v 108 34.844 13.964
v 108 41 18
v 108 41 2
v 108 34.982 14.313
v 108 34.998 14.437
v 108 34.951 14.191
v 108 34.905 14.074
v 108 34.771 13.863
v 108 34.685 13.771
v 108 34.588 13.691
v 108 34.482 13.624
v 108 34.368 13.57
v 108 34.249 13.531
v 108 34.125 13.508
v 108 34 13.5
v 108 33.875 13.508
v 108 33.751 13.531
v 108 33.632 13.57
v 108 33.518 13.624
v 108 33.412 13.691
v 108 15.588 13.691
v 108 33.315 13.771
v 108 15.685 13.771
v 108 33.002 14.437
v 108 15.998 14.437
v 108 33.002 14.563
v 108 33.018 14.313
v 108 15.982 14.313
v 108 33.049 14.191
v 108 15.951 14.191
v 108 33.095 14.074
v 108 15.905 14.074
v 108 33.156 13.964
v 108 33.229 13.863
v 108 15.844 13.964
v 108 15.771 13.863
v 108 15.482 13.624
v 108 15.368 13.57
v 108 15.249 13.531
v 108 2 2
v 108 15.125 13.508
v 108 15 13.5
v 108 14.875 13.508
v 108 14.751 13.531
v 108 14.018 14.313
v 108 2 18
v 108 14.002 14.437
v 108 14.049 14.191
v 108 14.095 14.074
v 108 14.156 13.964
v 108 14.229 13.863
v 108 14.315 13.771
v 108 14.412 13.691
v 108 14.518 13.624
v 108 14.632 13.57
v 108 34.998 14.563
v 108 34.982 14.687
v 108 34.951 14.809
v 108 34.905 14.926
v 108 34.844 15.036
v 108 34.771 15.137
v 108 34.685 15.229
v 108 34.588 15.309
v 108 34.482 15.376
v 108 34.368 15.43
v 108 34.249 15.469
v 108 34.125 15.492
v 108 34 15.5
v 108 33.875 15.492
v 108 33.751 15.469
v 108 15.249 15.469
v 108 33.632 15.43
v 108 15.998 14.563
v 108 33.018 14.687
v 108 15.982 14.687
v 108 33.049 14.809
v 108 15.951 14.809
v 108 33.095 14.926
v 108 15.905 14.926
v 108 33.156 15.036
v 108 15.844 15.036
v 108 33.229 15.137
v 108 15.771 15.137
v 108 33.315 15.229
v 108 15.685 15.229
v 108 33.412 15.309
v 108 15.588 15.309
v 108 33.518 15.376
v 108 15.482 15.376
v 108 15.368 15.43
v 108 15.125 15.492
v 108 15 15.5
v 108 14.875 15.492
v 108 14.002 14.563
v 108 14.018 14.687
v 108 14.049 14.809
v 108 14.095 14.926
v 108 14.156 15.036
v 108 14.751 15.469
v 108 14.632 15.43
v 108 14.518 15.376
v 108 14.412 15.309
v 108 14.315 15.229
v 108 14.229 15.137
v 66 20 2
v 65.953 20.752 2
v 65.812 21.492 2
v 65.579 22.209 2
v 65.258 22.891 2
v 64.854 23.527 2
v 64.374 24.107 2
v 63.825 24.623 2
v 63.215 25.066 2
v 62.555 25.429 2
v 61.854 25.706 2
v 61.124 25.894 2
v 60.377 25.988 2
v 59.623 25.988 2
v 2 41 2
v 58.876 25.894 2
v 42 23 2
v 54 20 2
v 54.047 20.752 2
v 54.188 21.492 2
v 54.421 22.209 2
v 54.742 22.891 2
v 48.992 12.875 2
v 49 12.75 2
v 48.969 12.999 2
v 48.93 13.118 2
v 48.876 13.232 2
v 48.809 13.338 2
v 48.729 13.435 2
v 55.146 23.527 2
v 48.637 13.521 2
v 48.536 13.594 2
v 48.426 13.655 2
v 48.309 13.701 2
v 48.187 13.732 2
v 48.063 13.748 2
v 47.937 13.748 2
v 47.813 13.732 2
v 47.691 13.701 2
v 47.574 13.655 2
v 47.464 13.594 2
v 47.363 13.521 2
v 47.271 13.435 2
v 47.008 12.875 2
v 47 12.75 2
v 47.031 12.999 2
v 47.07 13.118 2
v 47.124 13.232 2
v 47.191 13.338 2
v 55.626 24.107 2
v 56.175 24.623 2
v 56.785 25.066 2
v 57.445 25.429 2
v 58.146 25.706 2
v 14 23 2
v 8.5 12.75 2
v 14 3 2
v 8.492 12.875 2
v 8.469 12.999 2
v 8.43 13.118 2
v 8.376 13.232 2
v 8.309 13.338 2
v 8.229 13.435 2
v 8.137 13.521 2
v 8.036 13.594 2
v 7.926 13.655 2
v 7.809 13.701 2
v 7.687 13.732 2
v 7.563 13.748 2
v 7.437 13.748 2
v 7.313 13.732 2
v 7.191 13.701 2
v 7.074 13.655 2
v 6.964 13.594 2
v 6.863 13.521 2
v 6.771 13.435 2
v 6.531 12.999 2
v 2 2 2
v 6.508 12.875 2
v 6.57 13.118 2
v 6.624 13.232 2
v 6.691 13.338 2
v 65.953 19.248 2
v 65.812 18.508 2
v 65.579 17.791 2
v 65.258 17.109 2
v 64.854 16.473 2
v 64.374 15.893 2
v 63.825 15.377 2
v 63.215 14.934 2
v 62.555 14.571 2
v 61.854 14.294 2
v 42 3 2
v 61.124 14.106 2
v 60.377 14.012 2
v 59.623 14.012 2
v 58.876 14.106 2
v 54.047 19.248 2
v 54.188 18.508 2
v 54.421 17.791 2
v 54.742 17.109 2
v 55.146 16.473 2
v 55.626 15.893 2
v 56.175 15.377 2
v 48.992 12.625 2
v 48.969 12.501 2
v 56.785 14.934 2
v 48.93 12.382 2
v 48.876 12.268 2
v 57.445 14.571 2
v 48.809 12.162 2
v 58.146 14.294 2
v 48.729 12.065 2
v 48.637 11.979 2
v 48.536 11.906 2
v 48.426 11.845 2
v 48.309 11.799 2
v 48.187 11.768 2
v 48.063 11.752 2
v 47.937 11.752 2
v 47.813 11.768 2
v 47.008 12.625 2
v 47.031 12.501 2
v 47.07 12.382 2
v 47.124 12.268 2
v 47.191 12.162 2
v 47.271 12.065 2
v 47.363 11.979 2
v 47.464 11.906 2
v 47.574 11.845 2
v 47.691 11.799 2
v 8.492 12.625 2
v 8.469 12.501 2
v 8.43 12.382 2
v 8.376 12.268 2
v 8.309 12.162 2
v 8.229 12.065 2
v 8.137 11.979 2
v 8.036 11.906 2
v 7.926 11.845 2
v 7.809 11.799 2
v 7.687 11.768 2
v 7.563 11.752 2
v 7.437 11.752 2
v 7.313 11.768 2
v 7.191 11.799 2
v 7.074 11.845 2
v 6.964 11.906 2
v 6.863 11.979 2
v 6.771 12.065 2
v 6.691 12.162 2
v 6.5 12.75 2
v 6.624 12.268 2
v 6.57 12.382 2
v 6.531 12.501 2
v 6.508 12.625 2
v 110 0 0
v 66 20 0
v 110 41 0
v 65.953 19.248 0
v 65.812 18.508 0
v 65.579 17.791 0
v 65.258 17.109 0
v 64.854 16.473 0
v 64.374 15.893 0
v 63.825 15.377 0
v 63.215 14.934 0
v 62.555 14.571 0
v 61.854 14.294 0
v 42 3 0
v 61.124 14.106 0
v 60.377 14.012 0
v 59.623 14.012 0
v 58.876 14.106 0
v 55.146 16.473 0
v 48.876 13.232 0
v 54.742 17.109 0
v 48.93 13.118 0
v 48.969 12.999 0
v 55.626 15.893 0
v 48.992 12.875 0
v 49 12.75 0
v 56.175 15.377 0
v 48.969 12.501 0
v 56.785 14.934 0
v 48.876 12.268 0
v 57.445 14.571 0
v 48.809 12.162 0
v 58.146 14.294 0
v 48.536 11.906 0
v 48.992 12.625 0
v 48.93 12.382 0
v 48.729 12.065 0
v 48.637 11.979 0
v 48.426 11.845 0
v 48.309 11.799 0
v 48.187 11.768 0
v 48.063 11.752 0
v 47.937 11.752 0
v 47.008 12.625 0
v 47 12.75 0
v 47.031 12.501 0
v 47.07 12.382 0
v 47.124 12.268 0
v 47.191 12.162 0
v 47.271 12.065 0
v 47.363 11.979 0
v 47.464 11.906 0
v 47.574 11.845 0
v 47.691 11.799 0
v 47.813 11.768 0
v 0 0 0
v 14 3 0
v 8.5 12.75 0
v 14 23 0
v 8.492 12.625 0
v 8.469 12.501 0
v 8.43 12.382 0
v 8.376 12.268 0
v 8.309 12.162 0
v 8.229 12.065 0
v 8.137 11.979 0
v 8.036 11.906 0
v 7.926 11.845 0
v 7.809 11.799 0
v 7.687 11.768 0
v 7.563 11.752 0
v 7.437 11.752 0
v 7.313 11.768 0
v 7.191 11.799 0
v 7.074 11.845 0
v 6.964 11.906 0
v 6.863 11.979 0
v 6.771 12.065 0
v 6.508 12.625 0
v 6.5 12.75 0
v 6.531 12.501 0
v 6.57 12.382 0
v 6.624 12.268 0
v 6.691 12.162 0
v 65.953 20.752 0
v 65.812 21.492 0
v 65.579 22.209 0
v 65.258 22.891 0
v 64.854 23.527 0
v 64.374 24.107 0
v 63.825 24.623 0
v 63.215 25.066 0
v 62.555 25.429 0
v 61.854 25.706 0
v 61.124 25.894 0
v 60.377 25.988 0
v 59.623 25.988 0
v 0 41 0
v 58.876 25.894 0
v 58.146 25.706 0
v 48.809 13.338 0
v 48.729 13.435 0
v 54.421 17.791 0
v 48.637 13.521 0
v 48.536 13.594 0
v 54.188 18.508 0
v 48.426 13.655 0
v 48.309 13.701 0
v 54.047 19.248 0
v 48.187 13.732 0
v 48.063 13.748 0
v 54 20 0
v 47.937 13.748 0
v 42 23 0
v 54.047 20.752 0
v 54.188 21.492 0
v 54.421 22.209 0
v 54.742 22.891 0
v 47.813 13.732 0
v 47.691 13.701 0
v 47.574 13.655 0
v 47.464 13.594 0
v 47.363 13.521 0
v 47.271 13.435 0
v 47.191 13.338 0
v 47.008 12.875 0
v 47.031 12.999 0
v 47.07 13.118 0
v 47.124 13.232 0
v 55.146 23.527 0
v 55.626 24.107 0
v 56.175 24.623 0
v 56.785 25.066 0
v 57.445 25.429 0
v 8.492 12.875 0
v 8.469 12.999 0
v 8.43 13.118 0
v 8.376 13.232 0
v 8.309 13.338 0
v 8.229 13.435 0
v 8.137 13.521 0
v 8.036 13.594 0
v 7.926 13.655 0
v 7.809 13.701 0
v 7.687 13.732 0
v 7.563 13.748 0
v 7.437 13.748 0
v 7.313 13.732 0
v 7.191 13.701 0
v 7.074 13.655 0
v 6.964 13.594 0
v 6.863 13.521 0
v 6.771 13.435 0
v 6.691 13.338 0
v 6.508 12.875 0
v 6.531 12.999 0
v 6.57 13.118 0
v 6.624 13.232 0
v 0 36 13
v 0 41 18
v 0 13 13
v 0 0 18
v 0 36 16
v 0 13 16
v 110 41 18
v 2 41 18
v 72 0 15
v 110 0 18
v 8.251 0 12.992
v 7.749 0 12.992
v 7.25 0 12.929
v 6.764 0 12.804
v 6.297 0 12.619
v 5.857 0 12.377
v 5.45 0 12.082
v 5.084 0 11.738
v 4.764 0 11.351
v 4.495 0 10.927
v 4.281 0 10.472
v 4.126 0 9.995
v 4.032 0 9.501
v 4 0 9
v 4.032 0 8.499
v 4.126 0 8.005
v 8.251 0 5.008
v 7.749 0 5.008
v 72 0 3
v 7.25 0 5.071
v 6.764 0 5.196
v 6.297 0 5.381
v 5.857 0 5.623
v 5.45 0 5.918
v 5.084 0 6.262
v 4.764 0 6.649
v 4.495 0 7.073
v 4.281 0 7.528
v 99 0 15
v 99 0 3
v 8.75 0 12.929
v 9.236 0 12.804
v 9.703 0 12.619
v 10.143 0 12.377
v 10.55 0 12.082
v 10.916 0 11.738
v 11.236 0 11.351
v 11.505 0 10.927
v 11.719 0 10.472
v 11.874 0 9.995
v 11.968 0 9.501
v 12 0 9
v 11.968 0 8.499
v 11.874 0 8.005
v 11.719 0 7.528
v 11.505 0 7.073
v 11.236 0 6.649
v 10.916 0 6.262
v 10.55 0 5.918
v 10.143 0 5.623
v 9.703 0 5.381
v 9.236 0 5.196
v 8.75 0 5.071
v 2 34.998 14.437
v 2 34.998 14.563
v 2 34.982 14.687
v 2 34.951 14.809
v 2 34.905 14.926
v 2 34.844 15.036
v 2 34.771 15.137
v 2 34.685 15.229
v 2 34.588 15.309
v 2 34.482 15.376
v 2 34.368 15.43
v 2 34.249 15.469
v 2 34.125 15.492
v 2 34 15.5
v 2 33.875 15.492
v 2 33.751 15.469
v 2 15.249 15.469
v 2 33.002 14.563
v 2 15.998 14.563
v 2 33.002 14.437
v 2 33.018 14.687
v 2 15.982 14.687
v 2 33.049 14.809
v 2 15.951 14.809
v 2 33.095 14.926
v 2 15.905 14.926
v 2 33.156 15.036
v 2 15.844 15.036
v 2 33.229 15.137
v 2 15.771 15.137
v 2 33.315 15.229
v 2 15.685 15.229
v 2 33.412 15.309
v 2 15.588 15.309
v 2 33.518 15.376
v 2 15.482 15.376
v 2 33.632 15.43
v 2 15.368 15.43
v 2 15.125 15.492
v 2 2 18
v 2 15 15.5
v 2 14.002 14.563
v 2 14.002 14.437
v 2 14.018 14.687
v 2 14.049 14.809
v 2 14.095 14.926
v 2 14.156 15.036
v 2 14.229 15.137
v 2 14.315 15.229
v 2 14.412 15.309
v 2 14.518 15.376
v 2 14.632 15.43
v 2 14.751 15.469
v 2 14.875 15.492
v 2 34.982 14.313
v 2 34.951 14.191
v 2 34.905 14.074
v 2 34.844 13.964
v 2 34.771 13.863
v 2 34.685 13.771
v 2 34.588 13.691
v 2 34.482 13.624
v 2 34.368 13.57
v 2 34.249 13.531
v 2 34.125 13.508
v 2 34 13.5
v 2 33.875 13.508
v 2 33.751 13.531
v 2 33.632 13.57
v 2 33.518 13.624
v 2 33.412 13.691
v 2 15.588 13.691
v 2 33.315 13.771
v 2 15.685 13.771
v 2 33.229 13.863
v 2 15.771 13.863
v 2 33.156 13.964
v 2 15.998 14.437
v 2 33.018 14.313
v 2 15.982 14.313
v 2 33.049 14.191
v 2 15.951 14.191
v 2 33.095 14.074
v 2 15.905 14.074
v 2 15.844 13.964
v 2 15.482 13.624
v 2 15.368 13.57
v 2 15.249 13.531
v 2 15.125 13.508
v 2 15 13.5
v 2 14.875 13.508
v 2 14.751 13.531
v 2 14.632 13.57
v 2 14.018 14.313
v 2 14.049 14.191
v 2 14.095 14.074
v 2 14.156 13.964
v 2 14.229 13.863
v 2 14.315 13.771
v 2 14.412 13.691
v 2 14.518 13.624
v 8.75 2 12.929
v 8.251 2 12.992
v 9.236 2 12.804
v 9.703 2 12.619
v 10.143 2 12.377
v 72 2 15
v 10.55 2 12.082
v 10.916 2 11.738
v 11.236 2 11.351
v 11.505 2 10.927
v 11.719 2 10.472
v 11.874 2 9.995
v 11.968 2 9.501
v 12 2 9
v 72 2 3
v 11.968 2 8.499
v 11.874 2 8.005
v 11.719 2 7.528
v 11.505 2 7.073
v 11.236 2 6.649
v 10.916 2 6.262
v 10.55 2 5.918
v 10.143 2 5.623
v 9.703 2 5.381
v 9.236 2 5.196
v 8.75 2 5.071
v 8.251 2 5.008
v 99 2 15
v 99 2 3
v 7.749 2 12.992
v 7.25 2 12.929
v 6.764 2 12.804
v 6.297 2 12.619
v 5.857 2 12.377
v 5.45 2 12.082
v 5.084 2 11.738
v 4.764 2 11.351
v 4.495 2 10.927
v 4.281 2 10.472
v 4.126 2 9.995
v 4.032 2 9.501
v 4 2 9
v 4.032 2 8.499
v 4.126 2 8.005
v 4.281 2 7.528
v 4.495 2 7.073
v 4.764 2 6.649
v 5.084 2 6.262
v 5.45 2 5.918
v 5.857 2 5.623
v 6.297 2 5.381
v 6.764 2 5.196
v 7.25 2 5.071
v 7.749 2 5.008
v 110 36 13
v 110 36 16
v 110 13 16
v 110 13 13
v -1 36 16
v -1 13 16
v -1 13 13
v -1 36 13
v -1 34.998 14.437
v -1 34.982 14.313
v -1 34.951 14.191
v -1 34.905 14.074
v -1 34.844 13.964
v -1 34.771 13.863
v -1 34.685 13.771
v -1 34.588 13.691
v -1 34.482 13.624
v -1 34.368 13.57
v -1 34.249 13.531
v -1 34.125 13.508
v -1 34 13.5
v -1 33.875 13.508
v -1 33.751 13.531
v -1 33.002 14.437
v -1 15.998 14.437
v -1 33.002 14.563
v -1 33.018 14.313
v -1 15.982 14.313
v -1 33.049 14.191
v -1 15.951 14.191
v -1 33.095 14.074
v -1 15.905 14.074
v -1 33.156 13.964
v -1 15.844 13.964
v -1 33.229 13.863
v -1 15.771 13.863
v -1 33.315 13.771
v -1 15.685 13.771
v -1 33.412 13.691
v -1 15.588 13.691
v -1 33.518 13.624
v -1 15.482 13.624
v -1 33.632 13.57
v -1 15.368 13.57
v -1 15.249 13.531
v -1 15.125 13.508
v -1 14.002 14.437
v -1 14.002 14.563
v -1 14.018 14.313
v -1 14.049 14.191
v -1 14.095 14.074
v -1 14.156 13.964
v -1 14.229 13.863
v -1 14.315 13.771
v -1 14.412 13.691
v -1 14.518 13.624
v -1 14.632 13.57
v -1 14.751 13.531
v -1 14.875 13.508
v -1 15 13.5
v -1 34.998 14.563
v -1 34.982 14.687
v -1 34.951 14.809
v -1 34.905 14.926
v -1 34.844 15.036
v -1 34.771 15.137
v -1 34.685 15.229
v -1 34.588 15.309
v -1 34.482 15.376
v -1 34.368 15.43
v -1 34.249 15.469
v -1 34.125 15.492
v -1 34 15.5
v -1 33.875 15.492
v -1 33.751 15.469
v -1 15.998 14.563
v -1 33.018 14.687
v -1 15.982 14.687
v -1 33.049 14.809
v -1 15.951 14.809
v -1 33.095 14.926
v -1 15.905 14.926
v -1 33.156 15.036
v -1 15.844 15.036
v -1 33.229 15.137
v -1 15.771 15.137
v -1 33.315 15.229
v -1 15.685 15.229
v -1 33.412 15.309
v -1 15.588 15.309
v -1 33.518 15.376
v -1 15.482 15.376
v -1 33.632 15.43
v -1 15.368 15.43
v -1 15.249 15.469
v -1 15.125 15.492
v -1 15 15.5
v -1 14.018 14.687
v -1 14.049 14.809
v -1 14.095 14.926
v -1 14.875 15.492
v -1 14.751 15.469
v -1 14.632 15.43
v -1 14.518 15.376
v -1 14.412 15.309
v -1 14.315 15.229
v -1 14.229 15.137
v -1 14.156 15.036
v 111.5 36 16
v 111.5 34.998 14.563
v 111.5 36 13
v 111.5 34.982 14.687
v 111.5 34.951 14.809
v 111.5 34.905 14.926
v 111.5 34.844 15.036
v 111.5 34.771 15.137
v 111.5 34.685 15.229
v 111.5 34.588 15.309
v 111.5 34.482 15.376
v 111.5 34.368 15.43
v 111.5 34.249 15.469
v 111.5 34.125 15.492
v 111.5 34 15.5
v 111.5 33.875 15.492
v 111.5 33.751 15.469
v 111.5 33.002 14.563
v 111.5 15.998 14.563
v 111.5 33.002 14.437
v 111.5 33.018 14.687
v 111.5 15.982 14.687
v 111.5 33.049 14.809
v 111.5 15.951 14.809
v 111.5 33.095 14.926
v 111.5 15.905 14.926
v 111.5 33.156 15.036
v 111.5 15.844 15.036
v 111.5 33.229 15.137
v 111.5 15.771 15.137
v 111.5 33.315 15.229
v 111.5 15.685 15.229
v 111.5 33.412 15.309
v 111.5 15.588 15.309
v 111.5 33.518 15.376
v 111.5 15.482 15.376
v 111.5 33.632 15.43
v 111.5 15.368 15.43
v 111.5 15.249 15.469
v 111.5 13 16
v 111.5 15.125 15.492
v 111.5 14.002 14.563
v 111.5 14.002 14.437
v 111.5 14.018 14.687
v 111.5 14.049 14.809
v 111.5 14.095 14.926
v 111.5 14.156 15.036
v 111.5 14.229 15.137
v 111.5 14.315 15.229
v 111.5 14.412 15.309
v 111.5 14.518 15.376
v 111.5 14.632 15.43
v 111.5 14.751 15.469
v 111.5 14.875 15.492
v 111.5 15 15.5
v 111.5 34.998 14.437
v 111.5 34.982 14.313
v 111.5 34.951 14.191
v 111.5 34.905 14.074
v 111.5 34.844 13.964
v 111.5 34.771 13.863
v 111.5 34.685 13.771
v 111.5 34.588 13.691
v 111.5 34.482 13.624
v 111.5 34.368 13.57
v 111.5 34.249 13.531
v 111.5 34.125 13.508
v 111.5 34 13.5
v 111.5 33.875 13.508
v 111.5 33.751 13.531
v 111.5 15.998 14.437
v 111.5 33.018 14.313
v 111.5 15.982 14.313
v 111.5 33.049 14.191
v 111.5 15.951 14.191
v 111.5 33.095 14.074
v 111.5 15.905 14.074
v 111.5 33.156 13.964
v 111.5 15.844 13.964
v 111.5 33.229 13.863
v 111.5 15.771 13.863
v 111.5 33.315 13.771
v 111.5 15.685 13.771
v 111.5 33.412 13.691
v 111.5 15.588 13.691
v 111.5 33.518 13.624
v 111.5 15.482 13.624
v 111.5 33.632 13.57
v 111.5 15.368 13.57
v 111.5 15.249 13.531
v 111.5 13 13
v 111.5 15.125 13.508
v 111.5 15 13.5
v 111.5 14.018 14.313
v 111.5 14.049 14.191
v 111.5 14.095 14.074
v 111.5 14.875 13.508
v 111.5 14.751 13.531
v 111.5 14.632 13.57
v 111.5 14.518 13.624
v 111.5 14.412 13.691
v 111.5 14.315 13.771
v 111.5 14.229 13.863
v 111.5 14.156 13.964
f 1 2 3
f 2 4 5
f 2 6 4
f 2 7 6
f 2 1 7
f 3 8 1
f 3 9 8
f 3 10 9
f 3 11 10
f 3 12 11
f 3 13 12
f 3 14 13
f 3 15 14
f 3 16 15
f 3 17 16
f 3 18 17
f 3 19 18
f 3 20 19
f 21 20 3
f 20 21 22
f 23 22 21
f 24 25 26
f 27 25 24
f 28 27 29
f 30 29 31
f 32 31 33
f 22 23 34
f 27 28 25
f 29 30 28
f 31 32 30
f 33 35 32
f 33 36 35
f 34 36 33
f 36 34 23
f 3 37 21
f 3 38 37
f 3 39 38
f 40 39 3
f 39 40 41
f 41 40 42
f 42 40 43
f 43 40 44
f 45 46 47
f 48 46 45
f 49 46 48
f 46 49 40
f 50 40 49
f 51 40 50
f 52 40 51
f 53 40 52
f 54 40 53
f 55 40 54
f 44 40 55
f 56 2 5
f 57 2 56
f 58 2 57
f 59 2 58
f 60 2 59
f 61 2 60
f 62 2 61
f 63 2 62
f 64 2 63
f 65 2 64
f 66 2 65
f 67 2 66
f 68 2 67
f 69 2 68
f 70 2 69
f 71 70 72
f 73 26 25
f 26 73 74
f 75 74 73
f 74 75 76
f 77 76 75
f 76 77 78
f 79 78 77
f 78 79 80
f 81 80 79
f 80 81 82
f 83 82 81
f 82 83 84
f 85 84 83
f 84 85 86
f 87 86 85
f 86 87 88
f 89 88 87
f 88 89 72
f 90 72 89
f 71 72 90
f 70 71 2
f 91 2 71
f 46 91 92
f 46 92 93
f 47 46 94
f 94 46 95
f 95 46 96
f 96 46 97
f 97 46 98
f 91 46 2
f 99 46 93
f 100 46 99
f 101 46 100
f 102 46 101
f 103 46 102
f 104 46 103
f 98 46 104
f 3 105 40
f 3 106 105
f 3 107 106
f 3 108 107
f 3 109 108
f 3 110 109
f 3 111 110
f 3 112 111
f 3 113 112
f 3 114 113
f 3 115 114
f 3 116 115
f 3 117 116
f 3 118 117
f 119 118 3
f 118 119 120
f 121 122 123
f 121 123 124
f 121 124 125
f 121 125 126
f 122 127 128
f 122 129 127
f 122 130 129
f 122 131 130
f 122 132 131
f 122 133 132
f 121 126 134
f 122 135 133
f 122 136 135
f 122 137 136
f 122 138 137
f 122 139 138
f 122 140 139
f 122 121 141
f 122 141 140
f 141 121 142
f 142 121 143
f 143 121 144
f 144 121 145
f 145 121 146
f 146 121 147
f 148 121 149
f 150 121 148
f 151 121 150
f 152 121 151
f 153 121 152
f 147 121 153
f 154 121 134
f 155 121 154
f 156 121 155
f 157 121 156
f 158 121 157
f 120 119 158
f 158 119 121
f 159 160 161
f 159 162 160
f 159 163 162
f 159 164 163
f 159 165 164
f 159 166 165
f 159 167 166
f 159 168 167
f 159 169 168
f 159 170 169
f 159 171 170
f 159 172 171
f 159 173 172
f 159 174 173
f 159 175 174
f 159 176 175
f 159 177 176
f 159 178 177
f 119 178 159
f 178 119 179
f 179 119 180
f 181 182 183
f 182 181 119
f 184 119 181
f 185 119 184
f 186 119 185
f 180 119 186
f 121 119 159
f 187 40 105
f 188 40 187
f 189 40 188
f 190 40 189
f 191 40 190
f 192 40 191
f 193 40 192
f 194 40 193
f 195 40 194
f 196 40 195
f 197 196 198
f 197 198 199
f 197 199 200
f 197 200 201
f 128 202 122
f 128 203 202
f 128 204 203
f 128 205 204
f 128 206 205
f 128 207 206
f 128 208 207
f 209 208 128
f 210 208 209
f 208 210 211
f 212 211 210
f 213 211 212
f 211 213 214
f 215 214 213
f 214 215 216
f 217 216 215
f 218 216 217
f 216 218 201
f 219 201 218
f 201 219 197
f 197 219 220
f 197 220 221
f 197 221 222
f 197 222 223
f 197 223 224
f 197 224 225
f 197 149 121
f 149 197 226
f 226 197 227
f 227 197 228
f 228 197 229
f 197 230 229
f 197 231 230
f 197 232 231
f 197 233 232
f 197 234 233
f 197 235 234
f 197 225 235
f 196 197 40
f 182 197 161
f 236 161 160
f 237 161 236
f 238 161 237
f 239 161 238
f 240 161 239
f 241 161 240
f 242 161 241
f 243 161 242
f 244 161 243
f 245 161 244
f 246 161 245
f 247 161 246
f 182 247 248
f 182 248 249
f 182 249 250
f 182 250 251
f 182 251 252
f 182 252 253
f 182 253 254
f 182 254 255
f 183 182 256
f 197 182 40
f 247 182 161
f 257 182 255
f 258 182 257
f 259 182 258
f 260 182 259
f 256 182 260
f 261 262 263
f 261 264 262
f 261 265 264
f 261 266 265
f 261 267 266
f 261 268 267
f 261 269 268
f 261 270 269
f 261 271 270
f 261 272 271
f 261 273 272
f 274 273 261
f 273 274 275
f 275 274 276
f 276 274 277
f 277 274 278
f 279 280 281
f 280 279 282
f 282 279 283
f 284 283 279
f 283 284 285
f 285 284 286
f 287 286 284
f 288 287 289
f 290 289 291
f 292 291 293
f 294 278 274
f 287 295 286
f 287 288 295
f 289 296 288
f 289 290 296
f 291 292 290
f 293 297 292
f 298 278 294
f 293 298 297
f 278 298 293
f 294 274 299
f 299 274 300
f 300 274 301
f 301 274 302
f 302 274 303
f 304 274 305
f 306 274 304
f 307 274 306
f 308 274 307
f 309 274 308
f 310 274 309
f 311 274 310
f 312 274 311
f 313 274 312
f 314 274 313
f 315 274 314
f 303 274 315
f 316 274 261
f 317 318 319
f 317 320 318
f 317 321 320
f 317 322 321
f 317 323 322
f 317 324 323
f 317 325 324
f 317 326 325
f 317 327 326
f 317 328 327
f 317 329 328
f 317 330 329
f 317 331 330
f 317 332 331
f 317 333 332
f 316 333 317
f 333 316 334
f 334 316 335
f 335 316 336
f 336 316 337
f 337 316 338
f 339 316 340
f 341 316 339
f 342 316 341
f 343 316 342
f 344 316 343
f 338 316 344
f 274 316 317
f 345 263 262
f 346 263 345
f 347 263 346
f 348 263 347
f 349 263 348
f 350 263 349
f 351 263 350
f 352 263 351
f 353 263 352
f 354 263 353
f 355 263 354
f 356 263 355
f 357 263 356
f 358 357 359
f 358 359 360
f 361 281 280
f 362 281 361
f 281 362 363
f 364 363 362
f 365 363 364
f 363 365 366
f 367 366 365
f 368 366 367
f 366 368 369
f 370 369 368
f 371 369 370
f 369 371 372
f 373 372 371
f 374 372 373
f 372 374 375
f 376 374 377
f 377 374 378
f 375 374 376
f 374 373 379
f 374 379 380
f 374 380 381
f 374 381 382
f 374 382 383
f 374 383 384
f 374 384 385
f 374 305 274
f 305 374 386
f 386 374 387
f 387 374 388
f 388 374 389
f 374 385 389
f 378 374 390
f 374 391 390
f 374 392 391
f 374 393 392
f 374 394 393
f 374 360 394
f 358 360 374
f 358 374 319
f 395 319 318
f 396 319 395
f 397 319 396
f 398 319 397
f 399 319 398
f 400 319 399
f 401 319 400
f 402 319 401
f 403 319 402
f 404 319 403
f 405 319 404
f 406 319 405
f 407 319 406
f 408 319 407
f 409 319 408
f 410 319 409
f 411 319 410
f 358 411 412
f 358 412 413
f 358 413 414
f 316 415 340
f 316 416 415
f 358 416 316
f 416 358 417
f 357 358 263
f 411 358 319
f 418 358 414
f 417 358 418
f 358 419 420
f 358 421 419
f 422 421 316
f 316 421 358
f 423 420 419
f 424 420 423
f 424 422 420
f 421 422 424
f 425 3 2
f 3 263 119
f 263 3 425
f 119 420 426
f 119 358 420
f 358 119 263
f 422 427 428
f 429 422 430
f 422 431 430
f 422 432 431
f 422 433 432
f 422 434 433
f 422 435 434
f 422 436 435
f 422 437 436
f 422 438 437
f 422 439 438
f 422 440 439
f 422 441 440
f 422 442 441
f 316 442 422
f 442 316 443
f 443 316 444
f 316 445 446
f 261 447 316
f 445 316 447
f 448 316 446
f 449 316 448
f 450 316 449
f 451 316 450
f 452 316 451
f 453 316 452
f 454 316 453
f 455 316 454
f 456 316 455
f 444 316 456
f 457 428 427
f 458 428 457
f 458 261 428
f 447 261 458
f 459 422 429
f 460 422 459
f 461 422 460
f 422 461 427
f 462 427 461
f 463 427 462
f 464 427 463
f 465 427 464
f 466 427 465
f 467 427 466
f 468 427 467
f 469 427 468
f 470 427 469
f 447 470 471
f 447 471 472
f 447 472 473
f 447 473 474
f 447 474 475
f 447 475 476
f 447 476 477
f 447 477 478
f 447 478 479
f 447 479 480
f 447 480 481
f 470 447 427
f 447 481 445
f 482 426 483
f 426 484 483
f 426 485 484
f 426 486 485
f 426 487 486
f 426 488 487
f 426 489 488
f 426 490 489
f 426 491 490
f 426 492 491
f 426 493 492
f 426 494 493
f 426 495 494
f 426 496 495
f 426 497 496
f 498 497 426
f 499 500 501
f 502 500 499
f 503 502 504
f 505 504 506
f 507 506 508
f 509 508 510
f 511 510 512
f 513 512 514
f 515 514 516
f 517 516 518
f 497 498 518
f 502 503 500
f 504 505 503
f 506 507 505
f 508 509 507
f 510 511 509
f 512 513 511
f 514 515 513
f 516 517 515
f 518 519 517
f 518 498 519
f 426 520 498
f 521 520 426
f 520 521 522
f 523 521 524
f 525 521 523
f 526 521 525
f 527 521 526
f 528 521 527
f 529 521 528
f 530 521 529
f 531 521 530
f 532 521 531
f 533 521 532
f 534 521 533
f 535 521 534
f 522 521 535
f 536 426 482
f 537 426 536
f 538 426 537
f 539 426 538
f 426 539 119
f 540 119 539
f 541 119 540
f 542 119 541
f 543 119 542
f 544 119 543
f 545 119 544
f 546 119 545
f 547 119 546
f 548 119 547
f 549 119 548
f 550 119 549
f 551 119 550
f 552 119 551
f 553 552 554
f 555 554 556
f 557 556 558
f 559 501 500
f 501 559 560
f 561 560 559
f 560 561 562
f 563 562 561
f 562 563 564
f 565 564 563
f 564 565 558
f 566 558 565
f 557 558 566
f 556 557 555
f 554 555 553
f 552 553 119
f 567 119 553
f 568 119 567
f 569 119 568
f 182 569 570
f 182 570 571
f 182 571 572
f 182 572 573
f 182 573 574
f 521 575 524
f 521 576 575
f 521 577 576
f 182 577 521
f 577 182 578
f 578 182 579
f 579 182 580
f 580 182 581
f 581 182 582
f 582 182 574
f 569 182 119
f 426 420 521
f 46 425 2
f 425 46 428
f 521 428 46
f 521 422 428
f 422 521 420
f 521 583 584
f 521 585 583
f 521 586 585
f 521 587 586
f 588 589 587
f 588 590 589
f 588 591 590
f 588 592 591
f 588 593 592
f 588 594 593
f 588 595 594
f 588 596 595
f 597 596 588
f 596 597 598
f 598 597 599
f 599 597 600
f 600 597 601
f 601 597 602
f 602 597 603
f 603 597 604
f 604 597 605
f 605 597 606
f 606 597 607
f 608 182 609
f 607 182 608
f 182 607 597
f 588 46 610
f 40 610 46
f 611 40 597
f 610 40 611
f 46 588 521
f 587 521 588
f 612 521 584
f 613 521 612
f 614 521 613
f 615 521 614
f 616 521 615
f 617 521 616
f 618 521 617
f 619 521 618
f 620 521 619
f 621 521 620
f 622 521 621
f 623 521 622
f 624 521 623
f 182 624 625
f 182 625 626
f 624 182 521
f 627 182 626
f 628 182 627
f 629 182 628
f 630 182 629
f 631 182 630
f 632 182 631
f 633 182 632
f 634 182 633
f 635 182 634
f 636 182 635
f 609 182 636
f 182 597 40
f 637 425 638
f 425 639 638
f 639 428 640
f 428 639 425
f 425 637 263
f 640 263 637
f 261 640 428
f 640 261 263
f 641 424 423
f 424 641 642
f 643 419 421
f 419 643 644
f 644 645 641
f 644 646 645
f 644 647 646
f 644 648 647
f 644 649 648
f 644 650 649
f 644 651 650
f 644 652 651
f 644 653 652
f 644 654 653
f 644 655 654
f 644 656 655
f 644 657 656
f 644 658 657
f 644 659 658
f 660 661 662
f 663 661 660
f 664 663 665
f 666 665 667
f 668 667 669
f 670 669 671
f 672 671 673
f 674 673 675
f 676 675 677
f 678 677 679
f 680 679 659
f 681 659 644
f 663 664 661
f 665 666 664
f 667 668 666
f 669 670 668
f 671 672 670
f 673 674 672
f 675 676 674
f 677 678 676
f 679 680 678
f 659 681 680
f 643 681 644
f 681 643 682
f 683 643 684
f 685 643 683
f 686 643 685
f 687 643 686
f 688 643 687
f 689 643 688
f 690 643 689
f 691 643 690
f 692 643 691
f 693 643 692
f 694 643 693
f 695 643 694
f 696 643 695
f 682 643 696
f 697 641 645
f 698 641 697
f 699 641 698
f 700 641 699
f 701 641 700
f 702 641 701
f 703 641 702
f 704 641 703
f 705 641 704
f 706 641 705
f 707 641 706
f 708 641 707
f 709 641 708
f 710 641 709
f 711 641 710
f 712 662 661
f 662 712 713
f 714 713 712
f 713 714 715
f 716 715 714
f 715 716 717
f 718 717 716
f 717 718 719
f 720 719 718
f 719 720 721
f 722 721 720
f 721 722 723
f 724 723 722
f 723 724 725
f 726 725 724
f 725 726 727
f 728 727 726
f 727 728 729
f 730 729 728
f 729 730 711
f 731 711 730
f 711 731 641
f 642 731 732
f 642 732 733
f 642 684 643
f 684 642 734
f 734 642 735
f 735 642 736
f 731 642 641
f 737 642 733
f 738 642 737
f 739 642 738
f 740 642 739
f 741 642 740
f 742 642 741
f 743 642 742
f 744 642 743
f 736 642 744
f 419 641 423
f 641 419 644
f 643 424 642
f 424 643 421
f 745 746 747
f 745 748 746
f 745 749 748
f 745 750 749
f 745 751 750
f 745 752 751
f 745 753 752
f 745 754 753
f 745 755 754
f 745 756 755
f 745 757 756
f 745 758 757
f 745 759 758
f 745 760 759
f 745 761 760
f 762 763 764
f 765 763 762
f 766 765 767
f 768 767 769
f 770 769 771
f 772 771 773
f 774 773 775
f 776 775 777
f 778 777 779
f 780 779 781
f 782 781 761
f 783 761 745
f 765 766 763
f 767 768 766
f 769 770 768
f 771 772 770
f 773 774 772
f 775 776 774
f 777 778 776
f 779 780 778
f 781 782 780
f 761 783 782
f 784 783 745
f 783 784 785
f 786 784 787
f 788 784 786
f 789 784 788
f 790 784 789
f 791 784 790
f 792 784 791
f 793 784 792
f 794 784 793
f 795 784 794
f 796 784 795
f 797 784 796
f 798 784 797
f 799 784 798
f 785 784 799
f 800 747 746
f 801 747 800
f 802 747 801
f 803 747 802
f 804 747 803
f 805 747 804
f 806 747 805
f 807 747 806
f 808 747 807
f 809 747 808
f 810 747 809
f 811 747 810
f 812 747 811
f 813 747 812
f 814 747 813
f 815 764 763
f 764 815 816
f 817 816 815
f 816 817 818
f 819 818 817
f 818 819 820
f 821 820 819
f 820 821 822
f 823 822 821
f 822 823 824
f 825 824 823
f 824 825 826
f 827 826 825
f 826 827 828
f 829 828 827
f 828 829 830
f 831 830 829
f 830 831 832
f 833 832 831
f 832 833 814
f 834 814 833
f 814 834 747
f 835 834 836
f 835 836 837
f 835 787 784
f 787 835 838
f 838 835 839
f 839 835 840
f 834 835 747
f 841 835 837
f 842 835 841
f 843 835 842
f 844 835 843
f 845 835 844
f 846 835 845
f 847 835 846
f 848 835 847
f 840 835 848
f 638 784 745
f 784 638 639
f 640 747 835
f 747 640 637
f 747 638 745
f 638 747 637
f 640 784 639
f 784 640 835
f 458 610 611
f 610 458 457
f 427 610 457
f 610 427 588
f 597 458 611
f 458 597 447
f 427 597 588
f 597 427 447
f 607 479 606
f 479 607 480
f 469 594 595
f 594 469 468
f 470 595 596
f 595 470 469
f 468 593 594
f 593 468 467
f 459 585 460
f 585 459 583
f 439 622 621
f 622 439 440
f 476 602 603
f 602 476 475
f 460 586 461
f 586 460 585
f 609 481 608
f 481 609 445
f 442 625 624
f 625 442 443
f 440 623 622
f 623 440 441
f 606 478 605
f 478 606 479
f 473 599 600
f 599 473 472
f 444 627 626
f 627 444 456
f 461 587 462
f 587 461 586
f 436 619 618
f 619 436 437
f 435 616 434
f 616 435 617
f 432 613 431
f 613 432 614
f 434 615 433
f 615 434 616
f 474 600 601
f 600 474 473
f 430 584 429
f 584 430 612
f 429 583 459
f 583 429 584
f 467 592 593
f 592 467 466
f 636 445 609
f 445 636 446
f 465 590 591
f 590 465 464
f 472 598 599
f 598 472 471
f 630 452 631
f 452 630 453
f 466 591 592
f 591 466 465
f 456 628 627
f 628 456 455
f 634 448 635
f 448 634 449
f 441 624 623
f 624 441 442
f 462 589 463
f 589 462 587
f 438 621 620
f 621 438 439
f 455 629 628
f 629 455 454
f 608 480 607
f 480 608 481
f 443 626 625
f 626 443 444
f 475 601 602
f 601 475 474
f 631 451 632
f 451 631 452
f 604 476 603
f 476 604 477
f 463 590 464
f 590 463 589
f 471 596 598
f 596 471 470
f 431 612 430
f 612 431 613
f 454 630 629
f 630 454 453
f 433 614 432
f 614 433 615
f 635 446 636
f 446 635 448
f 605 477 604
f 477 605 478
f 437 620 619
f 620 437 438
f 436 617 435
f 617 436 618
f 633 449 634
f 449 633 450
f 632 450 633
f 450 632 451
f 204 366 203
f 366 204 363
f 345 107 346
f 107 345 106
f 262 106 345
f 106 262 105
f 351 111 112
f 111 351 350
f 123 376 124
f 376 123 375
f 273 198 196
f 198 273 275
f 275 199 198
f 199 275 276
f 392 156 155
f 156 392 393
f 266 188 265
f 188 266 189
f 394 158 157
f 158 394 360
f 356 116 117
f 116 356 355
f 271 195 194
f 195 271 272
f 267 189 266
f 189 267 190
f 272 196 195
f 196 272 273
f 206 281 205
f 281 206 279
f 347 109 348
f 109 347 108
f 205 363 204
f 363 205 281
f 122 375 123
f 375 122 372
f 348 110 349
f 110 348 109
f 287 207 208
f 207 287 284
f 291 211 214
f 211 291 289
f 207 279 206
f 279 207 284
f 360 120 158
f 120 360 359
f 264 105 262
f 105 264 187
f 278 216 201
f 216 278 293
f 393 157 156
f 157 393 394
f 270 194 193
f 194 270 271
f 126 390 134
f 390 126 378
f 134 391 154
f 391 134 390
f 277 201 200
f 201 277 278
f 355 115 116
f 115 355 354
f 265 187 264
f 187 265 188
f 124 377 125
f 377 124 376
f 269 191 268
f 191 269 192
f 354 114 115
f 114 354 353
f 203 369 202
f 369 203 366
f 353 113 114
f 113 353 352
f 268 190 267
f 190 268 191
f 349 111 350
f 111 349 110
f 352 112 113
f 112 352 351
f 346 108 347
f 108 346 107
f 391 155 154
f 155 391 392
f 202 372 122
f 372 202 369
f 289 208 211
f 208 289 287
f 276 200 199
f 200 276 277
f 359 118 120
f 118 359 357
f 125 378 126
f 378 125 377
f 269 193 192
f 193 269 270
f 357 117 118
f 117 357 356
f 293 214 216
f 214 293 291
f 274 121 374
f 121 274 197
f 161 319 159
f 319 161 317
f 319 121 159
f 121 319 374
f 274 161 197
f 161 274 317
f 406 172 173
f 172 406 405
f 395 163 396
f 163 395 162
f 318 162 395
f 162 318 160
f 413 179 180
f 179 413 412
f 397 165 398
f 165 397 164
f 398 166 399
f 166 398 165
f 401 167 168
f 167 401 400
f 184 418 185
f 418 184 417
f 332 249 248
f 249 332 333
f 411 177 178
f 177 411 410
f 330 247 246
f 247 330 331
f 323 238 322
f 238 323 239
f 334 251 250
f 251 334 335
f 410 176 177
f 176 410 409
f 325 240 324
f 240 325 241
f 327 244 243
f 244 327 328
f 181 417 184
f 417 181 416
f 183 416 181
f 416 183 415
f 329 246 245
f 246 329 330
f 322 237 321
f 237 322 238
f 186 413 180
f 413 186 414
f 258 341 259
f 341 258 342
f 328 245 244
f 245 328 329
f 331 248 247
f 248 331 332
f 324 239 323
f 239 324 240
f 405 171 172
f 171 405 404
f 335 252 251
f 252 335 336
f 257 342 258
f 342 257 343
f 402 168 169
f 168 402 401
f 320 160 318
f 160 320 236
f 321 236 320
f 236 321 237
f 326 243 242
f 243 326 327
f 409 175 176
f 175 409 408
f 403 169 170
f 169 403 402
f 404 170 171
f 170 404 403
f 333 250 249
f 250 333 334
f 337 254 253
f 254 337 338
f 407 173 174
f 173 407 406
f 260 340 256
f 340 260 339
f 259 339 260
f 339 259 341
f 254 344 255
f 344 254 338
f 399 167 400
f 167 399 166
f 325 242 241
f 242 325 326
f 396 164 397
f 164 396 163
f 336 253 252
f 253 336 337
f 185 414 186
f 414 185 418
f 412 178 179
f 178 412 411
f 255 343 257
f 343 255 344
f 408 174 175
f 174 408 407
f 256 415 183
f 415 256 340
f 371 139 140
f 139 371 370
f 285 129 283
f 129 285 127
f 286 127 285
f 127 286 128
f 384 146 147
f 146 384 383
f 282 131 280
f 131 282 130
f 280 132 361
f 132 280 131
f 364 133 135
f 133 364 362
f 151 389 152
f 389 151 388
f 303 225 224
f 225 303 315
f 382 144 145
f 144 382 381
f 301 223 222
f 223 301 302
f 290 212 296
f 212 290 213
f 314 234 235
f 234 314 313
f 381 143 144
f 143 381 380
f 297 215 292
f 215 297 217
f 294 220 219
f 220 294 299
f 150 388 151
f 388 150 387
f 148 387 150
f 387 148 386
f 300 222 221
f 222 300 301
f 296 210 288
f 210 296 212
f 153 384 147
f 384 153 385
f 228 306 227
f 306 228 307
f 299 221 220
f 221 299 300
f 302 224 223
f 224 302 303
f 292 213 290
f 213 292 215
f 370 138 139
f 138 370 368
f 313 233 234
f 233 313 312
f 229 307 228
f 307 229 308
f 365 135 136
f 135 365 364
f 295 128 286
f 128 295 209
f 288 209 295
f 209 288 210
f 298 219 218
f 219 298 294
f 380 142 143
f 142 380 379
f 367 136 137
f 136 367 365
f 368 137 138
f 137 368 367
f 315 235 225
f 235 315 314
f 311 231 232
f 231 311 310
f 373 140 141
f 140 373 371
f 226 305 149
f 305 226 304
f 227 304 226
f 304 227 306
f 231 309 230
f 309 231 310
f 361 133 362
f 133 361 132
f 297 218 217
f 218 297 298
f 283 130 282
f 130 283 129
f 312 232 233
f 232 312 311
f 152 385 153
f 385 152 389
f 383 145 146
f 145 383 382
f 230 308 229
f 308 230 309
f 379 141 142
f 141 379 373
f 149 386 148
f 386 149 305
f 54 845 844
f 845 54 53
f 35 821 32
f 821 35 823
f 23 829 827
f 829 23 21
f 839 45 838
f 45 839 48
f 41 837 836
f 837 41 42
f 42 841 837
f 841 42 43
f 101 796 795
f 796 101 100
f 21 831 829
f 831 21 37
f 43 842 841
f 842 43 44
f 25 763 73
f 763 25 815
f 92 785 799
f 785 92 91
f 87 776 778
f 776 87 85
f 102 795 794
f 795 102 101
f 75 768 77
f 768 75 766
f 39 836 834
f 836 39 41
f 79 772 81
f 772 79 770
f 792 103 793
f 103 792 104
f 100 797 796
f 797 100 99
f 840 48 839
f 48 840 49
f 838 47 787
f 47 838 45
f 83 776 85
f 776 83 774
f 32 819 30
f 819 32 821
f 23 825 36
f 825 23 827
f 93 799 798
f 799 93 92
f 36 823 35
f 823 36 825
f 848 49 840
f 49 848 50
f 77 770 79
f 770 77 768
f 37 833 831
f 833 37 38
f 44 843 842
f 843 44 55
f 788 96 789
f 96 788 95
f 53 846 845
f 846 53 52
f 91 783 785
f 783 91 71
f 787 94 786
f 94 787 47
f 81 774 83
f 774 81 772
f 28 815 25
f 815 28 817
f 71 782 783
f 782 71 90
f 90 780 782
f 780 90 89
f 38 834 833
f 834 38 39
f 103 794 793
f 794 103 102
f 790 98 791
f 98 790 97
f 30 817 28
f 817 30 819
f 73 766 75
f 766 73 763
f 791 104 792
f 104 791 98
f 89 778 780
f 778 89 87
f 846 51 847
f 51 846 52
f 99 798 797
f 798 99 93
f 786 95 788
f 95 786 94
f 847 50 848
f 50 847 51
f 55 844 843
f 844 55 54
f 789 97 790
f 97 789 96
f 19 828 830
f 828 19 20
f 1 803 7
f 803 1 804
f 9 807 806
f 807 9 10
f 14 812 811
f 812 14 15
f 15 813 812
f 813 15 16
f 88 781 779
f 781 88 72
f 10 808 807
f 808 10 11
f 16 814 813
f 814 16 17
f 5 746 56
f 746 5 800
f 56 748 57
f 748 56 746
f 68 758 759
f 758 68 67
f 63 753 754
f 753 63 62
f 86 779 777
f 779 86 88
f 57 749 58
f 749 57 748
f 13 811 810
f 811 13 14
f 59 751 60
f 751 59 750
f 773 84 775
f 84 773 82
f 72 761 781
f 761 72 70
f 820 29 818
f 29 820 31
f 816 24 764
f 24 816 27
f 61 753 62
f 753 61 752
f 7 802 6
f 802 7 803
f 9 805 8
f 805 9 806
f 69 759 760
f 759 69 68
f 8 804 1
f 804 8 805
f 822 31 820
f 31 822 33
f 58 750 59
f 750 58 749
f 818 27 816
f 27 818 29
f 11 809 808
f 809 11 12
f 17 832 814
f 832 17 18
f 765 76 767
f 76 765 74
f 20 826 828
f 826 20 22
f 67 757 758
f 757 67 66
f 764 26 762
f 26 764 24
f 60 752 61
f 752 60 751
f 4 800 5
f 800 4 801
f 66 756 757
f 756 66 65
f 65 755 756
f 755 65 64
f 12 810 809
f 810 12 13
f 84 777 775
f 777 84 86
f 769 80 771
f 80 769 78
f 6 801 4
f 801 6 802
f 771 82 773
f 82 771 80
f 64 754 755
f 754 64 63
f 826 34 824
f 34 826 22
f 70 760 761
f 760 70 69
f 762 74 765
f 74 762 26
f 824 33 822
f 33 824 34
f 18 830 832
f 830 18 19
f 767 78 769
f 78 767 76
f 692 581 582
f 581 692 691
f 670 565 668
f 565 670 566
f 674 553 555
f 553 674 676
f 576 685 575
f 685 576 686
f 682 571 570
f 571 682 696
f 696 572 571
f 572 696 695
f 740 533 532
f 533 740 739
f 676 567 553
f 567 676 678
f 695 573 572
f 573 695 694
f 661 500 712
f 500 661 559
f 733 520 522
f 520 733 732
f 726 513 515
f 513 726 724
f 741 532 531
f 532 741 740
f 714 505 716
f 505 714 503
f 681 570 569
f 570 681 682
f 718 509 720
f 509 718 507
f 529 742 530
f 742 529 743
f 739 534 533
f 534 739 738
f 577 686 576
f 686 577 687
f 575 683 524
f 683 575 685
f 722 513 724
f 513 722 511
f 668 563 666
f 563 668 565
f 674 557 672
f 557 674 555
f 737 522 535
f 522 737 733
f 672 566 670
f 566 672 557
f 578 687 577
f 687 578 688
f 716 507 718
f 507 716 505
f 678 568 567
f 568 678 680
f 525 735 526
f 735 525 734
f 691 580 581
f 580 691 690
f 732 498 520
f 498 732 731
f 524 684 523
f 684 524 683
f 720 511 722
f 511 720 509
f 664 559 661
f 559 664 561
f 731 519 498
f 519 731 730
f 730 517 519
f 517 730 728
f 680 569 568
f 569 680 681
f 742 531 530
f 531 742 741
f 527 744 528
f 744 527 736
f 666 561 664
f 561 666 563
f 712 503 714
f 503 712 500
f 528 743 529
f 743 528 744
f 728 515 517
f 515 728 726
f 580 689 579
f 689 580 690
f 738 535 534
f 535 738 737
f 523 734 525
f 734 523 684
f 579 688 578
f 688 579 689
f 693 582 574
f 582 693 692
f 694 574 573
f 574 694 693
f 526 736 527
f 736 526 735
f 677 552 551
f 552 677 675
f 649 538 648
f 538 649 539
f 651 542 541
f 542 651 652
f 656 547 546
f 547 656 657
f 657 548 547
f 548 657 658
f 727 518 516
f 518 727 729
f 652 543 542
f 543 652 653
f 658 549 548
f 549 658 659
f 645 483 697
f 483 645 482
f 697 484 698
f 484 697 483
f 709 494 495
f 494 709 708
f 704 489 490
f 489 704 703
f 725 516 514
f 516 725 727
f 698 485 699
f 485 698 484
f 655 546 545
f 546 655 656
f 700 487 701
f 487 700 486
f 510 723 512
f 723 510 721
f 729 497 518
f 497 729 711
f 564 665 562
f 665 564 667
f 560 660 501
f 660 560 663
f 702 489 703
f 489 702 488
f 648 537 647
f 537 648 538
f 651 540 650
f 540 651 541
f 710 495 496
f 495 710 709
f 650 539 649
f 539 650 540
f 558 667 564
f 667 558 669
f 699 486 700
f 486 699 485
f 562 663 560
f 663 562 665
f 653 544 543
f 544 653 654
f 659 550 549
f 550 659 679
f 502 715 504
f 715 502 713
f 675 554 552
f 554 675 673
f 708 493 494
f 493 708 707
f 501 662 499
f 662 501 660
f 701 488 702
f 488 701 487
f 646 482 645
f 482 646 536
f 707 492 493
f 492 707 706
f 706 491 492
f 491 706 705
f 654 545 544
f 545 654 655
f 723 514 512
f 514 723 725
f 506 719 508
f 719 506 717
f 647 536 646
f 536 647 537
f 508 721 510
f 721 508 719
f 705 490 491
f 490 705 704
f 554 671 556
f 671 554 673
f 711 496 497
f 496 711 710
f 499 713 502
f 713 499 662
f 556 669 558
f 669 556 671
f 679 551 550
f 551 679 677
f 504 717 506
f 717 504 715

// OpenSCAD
/*************************************************************************************************
Power Supply Terminal Cover for the power supply commonly used with the Bukobot and other 3d printers
Author: Mike Thompson (thingiverse: mike_linus)
Date Last Modified: 11/03/2013 4:19pm
Licensing: This work is licensed under a Creative Commons Attribution-NonCommercial-ShareAlike 3.0 Australia License.  Further 
information is available here - http://creativecommons.org/licenses/by-nc-sa/3.0/au/deed.en_GB
Description: simply change the cutout parameters to suit. Note: do not change length, height, depth and thickness parameters for the base unless you want to change the core dimensions.
**************************************************************************************************/

//***************************************************************
//don't change these base parameters unless you want to change the core dimensions.
//***************************************************************
hole_resolution=50;
base_length=108;
base_height=41;
base_depth=18;
base_thickness=2;
$fn=hole_resolution;

//***************************************************************
//change these cutout parameters to suit you own switch size etc.
//***************************************************************
switch_cutout_length=27;
switch_cutout_width=12;

led_cutout_radius=4;
grommet_cutout_radius=6;

power_plug_cutout_length=28;
power_plug_cutout_width=20;

screw_hole_cutout_radius=1;

module base(){
cube([base_length,base_height,base_thickness]);
cube([base_thickness,base_height,base_depth]);
cube([base_length,base_thickness,base_depth]);
translate([base_length,0,0])cube([base_thickness,base_height,base_depth]);
translate([-1,13,13])cube([1.5,23,3]);//slot retainer
translate([base_length+base_thickness,13,13])cube([1.5,23,3]);//slot retainer
}

difference(){
base();
translate([72,0,3])cube([switch_cutout_length,base_thickness,switch_cutout_width]);  //switch cutout
translate([8,3,9])rotate([90,0,0])cylinder(r=led_cutout_radius,h=5);  //led cutout
translate([60,20,0])cylinder(r=grommet_cutout_radius,h=5);  //12v lead cutout
translate([14,3,0])cube([power_plug_cutout_length,power_plug_cutout_width,base_thickness]);  //240v plug cutout
translate([7.5,12.75,0])cylinder(r=screw_hole_cutout_radius,h=5);  //240v plug screw hole
translate([48,12.75,0])cylinder(r=screw_hole_cutout_radius,h=5);  //240v plug screw hole
translate([base_length,15,14.5])rotate([0,90,0])cylinder(r=screw_hole_cutout_radius,h=5);  //retainer screw hole
translate([base_length,34,14.5])rotate([0,90,0])cylinder(r=screw_hole_cutout_radius,h=5);  //retainer screw hole
translate([-1,15,14.5])rotate([0,90,0])cylinder(r=screw_hole_cutout_radius,h=5);  //retainer screw hole
translate([-1,34,14.5])rotate([0,90,0])cylinder(r=screw_hole_cutout_radius,h=5);  //retainer screw hole
}
